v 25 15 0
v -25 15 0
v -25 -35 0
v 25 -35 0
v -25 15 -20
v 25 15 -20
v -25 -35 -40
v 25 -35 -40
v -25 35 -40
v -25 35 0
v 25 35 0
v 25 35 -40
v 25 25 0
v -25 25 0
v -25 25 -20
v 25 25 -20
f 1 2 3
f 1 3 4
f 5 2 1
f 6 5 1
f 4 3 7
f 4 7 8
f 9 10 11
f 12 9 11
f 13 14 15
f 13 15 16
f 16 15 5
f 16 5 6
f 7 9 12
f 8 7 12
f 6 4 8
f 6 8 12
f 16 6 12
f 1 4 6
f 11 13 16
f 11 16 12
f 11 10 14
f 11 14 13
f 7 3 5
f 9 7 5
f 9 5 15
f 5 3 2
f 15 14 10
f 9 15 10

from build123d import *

# Parameters (mm, degrees)
SKETCH1_W           = 50
SKETCH1_H           = 70
BOSS_EXTRUDE1_DEPTH = 40
SKETCH2_W           = 50
SKETCH2_H           = 10
CUT_EXTRUDE1_DEPTH  = 20


with BuildPart() as part:
    # Sketch1 → Boss-Extrude1 (new body)
    with BuildSketch(Plane.XY):
        Rectangle(SKETCH1_W, SKETCH1_H)
    extrude(amount=-BOSS_EXTRUDE1_DEPTH)

    # Sketch2 → Cut-Extrude1 (cut)
    with BuildSketch(Plane.XY):
        with Locations((0, 20)):
            Rectangle(SKETCH2_W, SKETCH2_H)
    extrude(amount=-CUT_EXTRUDE1_DEPTH, mode=Mode.SUBTRACT)


solid = part.part
